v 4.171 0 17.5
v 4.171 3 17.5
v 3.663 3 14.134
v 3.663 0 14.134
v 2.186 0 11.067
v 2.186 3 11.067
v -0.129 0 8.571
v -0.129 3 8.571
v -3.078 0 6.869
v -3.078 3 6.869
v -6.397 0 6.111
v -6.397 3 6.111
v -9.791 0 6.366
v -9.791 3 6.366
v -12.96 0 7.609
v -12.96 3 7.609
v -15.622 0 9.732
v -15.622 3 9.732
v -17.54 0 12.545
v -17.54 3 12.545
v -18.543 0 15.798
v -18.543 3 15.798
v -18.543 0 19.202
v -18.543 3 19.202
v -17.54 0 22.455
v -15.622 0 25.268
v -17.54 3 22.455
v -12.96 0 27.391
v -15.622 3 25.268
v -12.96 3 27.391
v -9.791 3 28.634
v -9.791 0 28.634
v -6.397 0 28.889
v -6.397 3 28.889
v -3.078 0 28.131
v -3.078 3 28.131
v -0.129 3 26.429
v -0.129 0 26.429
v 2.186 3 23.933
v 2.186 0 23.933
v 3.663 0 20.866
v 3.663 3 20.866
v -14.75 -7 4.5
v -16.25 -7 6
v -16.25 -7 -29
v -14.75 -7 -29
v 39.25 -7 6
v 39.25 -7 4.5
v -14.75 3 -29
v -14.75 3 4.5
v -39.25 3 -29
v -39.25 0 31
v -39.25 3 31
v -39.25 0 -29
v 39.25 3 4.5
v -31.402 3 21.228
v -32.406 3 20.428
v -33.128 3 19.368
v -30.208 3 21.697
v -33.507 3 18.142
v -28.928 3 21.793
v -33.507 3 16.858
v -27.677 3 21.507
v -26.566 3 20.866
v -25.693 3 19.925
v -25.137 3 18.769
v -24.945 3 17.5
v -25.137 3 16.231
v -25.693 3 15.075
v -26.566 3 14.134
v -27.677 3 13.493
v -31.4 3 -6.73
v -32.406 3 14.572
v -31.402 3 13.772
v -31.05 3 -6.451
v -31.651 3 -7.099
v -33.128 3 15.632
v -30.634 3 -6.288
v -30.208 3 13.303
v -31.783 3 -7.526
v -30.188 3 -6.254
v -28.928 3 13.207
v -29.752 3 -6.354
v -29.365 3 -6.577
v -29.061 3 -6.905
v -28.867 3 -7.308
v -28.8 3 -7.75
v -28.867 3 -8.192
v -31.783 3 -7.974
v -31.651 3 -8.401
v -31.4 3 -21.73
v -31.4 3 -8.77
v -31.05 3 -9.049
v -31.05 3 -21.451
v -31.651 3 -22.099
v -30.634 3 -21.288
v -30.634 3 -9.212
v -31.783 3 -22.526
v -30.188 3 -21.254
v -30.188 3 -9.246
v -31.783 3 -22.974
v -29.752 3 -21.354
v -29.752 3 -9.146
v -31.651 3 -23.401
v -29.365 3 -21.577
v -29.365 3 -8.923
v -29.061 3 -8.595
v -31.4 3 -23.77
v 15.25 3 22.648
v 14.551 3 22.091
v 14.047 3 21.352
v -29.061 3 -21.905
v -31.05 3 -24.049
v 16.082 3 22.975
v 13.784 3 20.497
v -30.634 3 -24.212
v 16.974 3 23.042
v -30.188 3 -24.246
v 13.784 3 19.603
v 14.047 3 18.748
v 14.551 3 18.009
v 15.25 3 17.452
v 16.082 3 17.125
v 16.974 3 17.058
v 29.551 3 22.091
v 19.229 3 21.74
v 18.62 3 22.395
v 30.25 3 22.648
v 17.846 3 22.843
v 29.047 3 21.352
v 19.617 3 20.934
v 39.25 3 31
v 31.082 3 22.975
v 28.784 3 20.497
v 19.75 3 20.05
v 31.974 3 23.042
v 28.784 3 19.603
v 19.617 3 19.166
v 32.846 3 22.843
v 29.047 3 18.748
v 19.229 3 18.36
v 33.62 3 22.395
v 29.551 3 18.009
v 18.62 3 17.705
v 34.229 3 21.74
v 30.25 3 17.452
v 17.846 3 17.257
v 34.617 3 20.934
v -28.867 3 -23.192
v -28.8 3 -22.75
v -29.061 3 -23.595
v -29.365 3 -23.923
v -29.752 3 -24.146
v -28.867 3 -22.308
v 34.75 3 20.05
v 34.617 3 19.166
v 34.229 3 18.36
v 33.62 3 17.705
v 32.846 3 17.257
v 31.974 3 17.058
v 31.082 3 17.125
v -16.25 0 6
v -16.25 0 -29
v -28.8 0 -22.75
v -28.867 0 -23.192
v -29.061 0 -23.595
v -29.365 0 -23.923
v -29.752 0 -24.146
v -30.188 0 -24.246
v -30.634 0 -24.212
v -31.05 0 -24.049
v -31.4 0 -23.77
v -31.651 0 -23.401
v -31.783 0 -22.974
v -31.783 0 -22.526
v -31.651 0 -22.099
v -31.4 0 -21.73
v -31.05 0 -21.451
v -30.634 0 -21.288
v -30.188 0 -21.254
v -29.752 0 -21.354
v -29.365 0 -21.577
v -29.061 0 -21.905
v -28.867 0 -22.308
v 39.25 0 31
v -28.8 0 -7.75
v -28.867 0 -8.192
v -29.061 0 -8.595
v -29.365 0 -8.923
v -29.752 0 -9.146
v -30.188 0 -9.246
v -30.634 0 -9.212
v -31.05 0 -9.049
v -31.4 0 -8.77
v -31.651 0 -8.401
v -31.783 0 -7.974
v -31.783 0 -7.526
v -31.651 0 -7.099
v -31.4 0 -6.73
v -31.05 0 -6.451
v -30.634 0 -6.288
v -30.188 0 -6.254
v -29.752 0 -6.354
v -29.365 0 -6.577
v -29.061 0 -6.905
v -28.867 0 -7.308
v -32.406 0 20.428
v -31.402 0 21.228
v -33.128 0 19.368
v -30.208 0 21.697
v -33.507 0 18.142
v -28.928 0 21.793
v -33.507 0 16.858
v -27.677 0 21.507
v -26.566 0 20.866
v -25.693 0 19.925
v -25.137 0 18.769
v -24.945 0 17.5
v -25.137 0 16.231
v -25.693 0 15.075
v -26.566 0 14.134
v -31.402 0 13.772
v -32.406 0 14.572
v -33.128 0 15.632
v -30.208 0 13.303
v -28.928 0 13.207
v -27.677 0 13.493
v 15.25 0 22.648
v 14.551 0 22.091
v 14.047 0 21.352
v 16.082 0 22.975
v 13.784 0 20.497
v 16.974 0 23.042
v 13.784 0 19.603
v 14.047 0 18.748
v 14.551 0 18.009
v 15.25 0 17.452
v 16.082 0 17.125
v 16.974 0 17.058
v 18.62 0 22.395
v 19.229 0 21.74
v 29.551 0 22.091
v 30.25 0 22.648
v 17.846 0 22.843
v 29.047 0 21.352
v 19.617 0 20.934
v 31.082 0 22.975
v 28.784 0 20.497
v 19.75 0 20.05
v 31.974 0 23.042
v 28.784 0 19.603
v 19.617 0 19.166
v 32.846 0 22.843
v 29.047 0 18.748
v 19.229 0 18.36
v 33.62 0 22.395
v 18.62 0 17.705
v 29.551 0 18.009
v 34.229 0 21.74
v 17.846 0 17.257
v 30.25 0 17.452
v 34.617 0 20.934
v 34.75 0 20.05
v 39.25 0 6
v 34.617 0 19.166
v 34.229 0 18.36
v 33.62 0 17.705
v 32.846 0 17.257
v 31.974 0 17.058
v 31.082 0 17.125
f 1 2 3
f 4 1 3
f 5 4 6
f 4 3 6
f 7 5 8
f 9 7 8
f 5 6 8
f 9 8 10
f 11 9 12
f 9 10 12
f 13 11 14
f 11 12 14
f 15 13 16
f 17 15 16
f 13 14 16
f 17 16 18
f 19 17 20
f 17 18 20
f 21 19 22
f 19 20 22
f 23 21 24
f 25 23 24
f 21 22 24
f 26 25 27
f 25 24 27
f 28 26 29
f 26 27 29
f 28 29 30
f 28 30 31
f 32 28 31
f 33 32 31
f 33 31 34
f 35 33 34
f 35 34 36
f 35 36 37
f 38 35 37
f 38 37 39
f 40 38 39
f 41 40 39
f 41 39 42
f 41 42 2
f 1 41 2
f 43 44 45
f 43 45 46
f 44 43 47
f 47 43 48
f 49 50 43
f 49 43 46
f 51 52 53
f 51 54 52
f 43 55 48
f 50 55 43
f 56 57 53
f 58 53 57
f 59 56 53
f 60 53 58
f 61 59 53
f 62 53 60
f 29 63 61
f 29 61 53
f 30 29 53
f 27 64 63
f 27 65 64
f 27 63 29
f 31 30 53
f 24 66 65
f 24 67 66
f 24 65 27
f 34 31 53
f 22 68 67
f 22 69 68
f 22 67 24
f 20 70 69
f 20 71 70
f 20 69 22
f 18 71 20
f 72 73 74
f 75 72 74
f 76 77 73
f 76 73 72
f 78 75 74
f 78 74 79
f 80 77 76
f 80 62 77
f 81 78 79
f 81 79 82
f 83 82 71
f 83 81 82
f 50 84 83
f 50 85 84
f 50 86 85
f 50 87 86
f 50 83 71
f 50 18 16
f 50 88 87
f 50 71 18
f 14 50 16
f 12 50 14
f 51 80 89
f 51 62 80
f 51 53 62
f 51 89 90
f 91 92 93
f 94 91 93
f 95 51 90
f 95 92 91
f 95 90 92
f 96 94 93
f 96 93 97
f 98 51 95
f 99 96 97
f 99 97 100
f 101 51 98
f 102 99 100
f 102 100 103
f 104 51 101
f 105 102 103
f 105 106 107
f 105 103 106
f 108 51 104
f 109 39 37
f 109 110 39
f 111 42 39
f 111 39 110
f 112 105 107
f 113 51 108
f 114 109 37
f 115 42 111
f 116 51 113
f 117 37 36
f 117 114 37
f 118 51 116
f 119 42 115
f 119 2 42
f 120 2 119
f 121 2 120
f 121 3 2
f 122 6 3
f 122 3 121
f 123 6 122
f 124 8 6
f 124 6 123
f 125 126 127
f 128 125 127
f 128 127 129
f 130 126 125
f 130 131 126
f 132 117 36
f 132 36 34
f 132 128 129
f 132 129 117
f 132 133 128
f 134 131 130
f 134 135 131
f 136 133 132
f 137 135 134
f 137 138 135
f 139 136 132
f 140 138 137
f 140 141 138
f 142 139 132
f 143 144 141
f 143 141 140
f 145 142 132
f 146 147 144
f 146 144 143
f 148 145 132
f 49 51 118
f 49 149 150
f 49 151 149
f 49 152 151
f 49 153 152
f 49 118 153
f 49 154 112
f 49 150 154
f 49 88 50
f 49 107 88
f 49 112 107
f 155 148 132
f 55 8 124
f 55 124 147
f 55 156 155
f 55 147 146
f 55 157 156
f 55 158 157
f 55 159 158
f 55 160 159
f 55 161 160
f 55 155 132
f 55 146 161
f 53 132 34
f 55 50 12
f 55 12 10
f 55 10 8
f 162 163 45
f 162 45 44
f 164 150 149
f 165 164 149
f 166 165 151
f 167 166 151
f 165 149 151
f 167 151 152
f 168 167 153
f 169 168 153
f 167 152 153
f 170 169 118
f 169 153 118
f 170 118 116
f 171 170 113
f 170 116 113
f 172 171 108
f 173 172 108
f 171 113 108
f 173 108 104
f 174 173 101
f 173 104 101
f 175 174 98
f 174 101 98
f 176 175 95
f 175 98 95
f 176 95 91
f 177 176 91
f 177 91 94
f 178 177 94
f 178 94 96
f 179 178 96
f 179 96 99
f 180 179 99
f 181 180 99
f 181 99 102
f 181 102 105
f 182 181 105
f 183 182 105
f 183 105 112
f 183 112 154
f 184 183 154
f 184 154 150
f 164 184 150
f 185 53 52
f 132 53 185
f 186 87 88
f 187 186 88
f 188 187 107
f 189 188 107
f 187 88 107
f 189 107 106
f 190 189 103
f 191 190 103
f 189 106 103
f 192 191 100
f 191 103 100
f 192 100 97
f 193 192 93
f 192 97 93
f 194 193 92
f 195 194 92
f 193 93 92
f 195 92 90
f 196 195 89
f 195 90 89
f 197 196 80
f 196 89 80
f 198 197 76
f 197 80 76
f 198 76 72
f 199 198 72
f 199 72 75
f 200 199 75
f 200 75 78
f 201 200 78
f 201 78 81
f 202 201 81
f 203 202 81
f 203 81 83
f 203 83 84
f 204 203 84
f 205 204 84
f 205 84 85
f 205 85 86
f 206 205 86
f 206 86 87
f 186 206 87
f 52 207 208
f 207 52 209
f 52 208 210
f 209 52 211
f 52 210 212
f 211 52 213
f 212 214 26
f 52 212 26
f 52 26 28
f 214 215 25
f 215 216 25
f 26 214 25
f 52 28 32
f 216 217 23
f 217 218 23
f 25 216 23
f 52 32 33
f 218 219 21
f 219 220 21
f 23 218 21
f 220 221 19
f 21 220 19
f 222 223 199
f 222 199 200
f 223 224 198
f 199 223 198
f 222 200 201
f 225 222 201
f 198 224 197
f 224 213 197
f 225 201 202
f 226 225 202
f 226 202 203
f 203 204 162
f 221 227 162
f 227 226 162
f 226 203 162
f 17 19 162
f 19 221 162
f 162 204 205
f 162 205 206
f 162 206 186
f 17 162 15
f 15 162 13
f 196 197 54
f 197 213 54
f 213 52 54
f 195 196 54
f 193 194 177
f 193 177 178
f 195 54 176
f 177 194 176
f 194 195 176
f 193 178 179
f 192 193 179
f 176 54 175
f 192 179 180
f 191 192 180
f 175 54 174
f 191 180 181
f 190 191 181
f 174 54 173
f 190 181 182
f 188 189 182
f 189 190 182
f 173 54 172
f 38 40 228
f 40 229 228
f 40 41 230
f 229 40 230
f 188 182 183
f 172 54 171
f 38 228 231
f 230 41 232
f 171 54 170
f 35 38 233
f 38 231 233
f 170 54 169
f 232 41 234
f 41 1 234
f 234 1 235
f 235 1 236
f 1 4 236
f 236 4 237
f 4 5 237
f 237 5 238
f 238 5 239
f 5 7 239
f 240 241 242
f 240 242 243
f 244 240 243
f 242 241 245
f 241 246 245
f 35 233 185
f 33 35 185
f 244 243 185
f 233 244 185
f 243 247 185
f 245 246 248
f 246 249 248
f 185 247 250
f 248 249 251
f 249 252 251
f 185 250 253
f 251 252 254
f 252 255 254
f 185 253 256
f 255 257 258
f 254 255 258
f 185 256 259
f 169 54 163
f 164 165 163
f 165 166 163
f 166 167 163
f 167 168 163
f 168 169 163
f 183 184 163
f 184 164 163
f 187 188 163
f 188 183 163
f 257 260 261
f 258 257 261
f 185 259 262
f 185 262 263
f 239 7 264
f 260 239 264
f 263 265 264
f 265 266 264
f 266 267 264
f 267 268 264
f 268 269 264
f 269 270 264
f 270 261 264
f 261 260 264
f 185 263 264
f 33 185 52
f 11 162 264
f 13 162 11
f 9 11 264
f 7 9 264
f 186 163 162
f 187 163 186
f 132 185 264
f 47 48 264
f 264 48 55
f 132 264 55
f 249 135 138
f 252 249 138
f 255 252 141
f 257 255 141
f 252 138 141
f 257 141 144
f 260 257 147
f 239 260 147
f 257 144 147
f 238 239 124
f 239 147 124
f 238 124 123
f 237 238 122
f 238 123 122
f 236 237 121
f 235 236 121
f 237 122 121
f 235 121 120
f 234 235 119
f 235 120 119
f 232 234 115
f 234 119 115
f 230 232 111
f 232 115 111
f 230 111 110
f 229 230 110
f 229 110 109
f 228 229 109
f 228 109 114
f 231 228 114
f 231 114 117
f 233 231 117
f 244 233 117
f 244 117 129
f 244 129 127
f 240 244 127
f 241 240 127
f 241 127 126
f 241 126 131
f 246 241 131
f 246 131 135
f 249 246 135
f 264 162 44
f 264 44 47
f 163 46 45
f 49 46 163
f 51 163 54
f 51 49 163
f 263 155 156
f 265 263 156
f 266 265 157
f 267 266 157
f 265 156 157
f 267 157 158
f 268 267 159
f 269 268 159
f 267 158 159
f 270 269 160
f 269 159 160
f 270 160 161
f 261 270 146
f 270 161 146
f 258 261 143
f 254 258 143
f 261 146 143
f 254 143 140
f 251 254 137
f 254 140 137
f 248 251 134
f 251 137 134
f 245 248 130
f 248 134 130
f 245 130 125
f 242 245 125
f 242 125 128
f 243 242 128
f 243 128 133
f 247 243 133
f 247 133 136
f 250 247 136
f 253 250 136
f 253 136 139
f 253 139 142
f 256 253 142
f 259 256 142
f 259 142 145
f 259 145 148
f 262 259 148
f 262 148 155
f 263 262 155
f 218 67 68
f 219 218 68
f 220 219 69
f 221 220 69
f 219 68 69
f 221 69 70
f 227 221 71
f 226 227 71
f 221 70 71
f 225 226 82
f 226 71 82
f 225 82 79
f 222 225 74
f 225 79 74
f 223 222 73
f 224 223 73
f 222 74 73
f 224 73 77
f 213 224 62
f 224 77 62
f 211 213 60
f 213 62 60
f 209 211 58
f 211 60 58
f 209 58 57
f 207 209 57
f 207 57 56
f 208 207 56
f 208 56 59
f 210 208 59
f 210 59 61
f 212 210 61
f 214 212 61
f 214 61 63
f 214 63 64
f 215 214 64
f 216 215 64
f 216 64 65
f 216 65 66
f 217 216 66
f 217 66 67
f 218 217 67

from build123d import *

# Parameters (mm, degrees)
SALIENTE_EXTRUIR1_DEPTH = 3
CROQUIS2_R              = 3
CROQUIS2_R_2            = 1.5
CORTAR_EXTRUIR2_DEPTH   = 4
SALIENTE_EXTRUIR2_DEPTH = 10
CROQUIS4_R              = 11.420621249
CORTAR_EXTRUIR3_DEPTH   = 11
CROQUIS5_W              = 78.5
CROQUIS5_H              = 3
SALIENTE_EXTRUIR3_DEPTH = 2
CROQUIS6_R              = 4.304654485
CORTAR_EXTRUIR4_DEPTH   = 11


with BuildPart() as part:
    # Croquis1 → Saliente-Extruir1 (new body)
    with BuildSketch(Plane(origin=(0, 0, 0), x_dir=(1, 0, 0), z_dir=(0, 1, 0))):
        Polygon((-16.25, 29), (-16.25, -6), (39.25, -6), (39.25, -29), (-39.25, -29), (-39.25, 29), align=None)
    extrude(amount=SALIENTE_EXTRUIR1_DEPTH)

    # Croquis2 → Cortar-Extruir2 (cut, through all)
    with BuildSketch(Plane(origin=(0, 3, 0), x_dir=(1, 0, 0), z_dir=(0, 1, 0))):
        with Locations((31.75, -20.05)):
            Circle(CROQUIS2_R)
        with Locations((16.75, -20.05)):
            Circle(CROQUIS2_R)
        with Locations((-30.3, 22.75)):
            Circle(CROQUIS2_R_2)
        with Locations((-30.3, 7.75)):
            Circle(CROQUIS2_R_2)
    extrude(amount=-CORTAR_EXTRUIR2_DEPTH, mode=Mode.SUBTRACT)

    # Croquis3 → Saliente-Extruir2 (add)
    with BuildSketch(Plane(origin=(0, 3, 0), x_dir=(1, 0, 0), z_dir=(0, 1, 0))):
        Polygon((-16.25, 29), (-16.25, -6), (39.25, -6), (39.25, -4.5), (-14.75, -4.5), (-14.75, 29), align=None)
    extrude(amount=-SALIENTE_EXTRUIR2_DEPTH)

    # Croquis4 → Cortar-Extruir3 (cut, through all)
    with BuildSketch(Plane(origin=(0, 3, 0), x_dir=(1, 0, 0), z_dir=(0, 1, 0))):
        with Locations((-7.25, -17.5)):
            Circle(CROQUIS4_R)
    extrude(amount=-CORTAR_EXTRUIR3_DEPTH, mode=Mode.SUBTRACT)

    # Croquis5 → Saliente-Extruir3 (add)
    with BuildSketch(Plane.XY.offset(29)):
        with Locations((0, 1.5)):
            Rectangle(CROQUIS5_W, CROQUIS5_H)
    extrude(amount=SALIENTE_EXTRUIR3_DEPTH)

    # Croquis6 → Cortar-Extruir4 (cut, through all)
    with BuildSketch(Plane(origin=(0, 3, 0), x_dir=(1, 0, 0), z_dir=(0, 1, 0))):
        with Locations((-29.25, -17.5)):
            Circle(CROQUIS6_R)
    extrude(amount=-CORTAR_EXTRUIR4_DEPTH, mode=Mode.SUBTRACT)


solid = part.part
